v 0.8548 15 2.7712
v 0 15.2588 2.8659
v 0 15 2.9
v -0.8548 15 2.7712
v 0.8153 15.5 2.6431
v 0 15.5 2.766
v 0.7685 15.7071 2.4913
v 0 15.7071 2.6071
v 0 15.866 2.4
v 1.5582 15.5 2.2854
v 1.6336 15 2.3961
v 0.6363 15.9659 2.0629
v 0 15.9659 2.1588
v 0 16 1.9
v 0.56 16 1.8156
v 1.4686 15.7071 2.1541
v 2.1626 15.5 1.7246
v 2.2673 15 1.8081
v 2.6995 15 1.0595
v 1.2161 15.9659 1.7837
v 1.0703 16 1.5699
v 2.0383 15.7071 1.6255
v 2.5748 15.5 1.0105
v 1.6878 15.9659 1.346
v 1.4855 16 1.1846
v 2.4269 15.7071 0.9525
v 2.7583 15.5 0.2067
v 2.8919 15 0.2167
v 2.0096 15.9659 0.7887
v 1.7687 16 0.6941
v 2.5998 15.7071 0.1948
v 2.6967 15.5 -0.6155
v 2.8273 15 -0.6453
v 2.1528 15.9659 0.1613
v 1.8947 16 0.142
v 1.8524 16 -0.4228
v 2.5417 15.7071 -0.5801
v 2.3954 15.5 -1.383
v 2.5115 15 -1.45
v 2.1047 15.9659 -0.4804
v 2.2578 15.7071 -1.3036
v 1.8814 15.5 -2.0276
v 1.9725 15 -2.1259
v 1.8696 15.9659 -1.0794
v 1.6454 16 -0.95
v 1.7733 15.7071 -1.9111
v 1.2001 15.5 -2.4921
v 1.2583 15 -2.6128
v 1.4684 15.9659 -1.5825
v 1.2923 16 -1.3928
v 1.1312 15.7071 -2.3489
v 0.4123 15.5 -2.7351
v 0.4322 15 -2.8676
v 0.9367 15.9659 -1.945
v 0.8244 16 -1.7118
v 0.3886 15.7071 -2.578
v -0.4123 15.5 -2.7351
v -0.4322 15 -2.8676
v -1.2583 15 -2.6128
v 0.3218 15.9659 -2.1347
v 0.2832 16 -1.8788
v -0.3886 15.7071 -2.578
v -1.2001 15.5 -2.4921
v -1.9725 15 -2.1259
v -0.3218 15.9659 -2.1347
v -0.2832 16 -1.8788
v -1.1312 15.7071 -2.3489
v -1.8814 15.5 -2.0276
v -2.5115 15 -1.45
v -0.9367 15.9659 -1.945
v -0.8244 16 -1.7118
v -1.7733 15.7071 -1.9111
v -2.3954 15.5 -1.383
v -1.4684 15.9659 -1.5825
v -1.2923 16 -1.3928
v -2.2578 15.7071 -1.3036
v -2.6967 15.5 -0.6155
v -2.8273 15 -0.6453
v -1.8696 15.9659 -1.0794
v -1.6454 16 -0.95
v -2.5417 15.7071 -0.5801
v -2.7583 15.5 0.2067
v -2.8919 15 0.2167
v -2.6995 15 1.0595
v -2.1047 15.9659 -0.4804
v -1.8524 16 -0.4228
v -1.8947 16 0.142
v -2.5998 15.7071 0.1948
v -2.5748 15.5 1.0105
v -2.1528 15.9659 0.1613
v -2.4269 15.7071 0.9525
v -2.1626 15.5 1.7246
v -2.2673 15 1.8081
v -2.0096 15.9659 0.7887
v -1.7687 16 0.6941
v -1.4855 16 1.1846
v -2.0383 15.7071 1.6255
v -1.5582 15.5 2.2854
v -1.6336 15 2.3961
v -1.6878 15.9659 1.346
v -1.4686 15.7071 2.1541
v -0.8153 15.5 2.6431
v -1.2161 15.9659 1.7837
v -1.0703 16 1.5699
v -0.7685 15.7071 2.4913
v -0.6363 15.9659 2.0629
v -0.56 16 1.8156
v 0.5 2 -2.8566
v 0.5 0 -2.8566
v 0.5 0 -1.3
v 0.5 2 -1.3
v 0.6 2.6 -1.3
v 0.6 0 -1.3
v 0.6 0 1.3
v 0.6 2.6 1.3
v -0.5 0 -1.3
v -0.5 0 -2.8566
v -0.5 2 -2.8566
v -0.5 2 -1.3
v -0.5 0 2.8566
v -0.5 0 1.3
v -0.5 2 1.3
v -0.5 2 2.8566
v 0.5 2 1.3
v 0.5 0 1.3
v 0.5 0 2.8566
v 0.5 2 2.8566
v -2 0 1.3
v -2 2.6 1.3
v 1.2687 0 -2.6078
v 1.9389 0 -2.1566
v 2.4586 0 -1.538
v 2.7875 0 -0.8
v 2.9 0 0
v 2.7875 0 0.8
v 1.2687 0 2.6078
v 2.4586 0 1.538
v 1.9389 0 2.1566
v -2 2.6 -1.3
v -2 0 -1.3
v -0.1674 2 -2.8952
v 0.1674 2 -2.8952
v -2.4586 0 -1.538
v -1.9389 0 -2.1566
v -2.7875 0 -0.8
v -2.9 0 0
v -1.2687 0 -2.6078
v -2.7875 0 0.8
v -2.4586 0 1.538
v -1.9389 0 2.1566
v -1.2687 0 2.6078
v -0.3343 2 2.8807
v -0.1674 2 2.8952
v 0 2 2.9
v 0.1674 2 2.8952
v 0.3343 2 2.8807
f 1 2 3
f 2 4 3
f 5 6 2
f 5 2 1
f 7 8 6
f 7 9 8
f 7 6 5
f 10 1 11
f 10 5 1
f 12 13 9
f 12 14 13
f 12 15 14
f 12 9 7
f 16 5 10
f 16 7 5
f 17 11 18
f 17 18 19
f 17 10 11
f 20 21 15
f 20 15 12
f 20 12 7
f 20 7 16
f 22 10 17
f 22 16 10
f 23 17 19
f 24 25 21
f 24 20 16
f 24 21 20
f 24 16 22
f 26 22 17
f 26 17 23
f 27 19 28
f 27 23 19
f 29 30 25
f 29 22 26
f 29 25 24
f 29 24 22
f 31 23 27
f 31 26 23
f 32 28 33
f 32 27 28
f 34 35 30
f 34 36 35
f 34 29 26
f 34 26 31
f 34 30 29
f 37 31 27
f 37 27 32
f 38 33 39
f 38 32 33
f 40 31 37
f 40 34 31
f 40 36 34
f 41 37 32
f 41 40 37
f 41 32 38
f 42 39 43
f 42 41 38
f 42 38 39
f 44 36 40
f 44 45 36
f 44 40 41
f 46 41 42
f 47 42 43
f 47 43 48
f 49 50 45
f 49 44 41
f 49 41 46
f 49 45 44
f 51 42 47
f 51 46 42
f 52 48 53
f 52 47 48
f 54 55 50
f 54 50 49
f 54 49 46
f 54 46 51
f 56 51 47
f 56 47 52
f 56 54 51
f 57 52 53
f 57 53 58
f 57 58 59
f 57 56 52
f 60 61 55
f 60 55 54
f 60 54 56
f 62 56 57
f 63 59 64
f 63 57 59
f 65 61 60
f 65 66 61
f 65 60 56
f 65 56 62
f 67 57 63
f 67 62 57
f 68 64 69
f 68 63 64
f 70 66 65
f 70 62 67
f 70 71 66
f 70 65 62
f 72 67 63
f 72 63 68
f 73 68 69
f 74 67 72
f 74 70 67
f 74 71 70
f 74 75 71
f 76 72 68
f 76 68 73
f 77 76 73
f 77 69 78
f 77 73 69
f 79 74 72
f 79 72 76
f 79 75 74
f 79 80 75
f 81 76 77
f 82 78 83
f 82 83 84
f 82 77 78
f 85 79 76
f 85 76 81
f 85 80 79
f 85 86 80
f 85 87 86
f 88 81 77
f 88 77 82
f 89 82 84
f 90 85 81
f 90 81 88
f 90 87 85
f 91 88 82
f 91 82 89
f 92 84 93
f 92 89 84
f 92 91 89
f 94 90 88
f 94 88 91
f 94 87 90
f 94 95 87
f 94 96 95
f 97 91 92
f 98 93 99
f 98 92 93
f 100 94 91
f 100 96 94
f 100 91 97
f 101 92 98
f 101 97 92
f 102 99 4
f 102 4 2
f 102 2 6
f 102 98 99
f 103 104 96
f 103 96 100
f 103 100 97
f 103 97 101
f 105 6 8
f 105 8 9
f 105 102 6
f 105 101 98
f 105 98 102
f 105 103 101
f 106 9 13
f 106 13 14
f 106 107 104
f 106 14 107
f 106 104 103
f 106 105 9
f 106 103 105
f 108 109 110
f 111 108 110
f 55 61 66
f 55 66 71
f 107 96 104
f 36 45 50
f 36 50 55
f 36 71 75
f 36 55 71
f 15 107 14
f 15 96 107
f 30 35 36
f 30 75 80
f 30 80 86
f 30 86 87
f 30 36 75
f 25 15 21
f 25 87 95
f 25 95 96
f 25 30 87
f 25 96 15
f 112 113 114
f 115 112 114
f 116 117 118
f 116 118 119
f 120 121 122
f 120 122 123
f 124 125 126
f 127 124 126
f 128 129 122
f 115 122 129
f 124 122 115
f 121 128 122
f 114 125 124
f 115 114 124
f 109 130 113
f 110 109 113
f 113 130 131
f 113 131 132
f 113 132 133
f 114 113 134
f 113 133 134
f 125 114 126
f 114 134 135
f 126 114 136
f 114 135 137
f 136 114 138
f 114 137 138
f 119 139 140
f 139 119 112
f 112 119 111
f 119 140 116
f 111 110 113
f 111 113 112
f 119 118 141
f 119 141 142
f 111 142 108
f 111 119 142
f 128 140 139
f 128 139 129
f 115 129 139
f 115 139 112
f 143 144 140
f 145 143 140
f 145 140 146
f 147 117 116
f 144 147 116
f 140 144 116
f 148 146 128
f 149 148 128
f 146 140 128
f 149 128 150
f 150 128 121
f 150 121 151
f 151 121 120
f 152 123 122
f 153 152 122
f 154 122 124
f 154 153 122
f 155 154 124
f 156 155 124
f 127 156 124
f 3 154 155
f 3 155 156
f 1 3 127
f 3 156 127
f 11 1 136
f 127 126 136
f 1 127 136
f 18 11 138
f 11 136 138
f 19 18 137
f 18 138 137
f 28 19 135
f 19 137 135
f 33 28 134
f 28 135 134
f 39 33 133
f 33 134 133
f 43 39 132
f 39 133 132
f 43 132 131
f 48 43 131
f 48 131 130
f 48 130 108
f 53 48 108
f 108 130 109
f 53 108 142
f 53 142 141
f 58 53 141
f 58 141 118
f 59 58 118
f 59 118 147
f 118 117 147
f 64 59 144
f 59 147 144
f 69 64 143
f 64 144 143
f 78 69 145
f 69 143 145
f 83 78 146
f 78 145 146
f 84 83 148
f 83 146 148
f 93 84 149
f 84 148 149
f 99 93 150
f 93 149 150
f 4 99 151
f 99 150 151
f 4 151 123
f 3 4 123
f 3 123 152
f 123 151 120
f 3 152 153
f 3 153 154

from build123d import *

# Parameters (mm, degrees)
SKETCH1_R           = 2.9
BOSS_EXTRUDE1_DEPTH = 16
FILLET1_R           = 1
SKETCH2_W           = 2.6
SKETCH2_H           = 2.6
CUT_EXTRUDE1_DEPTH  = 2.6
SKETCH3_W           = 1
SKETCH3_H           = 6.114897194
CUT_EXTRUDE2_DEPTH  = 2


with BuildPart() as part:
    # Sketch1 → Boss-Extrude1 (new body)
    with BuildSketch(Plane(origin=(0, 0, 0), x_dir=(1, 0, 0), z_dir=(0, 1, 0))):
        with Locations(Location((0, 0, 0), (0, 0, 270))):
            Circle(SKETCH1_R)
    extrude(amount=BOSS_EXTRUDE1_DEPTH)

    # Fillet1
    fillet1_edges = [part.edges().sort_by_distance(p)[0] for p in [
        (0, 16, -2.9),
    ]]
    fillet(fillet1_edges, radius=FILLET1_R)

    # Sketch2 → Cut-Extrude1 (cut)
    with BuildSketch(Plane.XZ):
        with Locations((-0.7, 0)):
            Rectangle(SKETCH2_W, SKETCH2_H)
    extrude(amount=-CUT_EXTRUDE1_DEPTH, mode=Mode.SUBTRACT)

    # Sketch3 → Cut-Extrude2 (cut)
    with BuildSketch(Plane.XZ):
        Rectangle(SKETCH3_W, SKETCH3_H)
    extrude(amount=-CUT_EXTRUDE2_DEPTH, mode=Mode.SUBTRACT)


solid = part.part
